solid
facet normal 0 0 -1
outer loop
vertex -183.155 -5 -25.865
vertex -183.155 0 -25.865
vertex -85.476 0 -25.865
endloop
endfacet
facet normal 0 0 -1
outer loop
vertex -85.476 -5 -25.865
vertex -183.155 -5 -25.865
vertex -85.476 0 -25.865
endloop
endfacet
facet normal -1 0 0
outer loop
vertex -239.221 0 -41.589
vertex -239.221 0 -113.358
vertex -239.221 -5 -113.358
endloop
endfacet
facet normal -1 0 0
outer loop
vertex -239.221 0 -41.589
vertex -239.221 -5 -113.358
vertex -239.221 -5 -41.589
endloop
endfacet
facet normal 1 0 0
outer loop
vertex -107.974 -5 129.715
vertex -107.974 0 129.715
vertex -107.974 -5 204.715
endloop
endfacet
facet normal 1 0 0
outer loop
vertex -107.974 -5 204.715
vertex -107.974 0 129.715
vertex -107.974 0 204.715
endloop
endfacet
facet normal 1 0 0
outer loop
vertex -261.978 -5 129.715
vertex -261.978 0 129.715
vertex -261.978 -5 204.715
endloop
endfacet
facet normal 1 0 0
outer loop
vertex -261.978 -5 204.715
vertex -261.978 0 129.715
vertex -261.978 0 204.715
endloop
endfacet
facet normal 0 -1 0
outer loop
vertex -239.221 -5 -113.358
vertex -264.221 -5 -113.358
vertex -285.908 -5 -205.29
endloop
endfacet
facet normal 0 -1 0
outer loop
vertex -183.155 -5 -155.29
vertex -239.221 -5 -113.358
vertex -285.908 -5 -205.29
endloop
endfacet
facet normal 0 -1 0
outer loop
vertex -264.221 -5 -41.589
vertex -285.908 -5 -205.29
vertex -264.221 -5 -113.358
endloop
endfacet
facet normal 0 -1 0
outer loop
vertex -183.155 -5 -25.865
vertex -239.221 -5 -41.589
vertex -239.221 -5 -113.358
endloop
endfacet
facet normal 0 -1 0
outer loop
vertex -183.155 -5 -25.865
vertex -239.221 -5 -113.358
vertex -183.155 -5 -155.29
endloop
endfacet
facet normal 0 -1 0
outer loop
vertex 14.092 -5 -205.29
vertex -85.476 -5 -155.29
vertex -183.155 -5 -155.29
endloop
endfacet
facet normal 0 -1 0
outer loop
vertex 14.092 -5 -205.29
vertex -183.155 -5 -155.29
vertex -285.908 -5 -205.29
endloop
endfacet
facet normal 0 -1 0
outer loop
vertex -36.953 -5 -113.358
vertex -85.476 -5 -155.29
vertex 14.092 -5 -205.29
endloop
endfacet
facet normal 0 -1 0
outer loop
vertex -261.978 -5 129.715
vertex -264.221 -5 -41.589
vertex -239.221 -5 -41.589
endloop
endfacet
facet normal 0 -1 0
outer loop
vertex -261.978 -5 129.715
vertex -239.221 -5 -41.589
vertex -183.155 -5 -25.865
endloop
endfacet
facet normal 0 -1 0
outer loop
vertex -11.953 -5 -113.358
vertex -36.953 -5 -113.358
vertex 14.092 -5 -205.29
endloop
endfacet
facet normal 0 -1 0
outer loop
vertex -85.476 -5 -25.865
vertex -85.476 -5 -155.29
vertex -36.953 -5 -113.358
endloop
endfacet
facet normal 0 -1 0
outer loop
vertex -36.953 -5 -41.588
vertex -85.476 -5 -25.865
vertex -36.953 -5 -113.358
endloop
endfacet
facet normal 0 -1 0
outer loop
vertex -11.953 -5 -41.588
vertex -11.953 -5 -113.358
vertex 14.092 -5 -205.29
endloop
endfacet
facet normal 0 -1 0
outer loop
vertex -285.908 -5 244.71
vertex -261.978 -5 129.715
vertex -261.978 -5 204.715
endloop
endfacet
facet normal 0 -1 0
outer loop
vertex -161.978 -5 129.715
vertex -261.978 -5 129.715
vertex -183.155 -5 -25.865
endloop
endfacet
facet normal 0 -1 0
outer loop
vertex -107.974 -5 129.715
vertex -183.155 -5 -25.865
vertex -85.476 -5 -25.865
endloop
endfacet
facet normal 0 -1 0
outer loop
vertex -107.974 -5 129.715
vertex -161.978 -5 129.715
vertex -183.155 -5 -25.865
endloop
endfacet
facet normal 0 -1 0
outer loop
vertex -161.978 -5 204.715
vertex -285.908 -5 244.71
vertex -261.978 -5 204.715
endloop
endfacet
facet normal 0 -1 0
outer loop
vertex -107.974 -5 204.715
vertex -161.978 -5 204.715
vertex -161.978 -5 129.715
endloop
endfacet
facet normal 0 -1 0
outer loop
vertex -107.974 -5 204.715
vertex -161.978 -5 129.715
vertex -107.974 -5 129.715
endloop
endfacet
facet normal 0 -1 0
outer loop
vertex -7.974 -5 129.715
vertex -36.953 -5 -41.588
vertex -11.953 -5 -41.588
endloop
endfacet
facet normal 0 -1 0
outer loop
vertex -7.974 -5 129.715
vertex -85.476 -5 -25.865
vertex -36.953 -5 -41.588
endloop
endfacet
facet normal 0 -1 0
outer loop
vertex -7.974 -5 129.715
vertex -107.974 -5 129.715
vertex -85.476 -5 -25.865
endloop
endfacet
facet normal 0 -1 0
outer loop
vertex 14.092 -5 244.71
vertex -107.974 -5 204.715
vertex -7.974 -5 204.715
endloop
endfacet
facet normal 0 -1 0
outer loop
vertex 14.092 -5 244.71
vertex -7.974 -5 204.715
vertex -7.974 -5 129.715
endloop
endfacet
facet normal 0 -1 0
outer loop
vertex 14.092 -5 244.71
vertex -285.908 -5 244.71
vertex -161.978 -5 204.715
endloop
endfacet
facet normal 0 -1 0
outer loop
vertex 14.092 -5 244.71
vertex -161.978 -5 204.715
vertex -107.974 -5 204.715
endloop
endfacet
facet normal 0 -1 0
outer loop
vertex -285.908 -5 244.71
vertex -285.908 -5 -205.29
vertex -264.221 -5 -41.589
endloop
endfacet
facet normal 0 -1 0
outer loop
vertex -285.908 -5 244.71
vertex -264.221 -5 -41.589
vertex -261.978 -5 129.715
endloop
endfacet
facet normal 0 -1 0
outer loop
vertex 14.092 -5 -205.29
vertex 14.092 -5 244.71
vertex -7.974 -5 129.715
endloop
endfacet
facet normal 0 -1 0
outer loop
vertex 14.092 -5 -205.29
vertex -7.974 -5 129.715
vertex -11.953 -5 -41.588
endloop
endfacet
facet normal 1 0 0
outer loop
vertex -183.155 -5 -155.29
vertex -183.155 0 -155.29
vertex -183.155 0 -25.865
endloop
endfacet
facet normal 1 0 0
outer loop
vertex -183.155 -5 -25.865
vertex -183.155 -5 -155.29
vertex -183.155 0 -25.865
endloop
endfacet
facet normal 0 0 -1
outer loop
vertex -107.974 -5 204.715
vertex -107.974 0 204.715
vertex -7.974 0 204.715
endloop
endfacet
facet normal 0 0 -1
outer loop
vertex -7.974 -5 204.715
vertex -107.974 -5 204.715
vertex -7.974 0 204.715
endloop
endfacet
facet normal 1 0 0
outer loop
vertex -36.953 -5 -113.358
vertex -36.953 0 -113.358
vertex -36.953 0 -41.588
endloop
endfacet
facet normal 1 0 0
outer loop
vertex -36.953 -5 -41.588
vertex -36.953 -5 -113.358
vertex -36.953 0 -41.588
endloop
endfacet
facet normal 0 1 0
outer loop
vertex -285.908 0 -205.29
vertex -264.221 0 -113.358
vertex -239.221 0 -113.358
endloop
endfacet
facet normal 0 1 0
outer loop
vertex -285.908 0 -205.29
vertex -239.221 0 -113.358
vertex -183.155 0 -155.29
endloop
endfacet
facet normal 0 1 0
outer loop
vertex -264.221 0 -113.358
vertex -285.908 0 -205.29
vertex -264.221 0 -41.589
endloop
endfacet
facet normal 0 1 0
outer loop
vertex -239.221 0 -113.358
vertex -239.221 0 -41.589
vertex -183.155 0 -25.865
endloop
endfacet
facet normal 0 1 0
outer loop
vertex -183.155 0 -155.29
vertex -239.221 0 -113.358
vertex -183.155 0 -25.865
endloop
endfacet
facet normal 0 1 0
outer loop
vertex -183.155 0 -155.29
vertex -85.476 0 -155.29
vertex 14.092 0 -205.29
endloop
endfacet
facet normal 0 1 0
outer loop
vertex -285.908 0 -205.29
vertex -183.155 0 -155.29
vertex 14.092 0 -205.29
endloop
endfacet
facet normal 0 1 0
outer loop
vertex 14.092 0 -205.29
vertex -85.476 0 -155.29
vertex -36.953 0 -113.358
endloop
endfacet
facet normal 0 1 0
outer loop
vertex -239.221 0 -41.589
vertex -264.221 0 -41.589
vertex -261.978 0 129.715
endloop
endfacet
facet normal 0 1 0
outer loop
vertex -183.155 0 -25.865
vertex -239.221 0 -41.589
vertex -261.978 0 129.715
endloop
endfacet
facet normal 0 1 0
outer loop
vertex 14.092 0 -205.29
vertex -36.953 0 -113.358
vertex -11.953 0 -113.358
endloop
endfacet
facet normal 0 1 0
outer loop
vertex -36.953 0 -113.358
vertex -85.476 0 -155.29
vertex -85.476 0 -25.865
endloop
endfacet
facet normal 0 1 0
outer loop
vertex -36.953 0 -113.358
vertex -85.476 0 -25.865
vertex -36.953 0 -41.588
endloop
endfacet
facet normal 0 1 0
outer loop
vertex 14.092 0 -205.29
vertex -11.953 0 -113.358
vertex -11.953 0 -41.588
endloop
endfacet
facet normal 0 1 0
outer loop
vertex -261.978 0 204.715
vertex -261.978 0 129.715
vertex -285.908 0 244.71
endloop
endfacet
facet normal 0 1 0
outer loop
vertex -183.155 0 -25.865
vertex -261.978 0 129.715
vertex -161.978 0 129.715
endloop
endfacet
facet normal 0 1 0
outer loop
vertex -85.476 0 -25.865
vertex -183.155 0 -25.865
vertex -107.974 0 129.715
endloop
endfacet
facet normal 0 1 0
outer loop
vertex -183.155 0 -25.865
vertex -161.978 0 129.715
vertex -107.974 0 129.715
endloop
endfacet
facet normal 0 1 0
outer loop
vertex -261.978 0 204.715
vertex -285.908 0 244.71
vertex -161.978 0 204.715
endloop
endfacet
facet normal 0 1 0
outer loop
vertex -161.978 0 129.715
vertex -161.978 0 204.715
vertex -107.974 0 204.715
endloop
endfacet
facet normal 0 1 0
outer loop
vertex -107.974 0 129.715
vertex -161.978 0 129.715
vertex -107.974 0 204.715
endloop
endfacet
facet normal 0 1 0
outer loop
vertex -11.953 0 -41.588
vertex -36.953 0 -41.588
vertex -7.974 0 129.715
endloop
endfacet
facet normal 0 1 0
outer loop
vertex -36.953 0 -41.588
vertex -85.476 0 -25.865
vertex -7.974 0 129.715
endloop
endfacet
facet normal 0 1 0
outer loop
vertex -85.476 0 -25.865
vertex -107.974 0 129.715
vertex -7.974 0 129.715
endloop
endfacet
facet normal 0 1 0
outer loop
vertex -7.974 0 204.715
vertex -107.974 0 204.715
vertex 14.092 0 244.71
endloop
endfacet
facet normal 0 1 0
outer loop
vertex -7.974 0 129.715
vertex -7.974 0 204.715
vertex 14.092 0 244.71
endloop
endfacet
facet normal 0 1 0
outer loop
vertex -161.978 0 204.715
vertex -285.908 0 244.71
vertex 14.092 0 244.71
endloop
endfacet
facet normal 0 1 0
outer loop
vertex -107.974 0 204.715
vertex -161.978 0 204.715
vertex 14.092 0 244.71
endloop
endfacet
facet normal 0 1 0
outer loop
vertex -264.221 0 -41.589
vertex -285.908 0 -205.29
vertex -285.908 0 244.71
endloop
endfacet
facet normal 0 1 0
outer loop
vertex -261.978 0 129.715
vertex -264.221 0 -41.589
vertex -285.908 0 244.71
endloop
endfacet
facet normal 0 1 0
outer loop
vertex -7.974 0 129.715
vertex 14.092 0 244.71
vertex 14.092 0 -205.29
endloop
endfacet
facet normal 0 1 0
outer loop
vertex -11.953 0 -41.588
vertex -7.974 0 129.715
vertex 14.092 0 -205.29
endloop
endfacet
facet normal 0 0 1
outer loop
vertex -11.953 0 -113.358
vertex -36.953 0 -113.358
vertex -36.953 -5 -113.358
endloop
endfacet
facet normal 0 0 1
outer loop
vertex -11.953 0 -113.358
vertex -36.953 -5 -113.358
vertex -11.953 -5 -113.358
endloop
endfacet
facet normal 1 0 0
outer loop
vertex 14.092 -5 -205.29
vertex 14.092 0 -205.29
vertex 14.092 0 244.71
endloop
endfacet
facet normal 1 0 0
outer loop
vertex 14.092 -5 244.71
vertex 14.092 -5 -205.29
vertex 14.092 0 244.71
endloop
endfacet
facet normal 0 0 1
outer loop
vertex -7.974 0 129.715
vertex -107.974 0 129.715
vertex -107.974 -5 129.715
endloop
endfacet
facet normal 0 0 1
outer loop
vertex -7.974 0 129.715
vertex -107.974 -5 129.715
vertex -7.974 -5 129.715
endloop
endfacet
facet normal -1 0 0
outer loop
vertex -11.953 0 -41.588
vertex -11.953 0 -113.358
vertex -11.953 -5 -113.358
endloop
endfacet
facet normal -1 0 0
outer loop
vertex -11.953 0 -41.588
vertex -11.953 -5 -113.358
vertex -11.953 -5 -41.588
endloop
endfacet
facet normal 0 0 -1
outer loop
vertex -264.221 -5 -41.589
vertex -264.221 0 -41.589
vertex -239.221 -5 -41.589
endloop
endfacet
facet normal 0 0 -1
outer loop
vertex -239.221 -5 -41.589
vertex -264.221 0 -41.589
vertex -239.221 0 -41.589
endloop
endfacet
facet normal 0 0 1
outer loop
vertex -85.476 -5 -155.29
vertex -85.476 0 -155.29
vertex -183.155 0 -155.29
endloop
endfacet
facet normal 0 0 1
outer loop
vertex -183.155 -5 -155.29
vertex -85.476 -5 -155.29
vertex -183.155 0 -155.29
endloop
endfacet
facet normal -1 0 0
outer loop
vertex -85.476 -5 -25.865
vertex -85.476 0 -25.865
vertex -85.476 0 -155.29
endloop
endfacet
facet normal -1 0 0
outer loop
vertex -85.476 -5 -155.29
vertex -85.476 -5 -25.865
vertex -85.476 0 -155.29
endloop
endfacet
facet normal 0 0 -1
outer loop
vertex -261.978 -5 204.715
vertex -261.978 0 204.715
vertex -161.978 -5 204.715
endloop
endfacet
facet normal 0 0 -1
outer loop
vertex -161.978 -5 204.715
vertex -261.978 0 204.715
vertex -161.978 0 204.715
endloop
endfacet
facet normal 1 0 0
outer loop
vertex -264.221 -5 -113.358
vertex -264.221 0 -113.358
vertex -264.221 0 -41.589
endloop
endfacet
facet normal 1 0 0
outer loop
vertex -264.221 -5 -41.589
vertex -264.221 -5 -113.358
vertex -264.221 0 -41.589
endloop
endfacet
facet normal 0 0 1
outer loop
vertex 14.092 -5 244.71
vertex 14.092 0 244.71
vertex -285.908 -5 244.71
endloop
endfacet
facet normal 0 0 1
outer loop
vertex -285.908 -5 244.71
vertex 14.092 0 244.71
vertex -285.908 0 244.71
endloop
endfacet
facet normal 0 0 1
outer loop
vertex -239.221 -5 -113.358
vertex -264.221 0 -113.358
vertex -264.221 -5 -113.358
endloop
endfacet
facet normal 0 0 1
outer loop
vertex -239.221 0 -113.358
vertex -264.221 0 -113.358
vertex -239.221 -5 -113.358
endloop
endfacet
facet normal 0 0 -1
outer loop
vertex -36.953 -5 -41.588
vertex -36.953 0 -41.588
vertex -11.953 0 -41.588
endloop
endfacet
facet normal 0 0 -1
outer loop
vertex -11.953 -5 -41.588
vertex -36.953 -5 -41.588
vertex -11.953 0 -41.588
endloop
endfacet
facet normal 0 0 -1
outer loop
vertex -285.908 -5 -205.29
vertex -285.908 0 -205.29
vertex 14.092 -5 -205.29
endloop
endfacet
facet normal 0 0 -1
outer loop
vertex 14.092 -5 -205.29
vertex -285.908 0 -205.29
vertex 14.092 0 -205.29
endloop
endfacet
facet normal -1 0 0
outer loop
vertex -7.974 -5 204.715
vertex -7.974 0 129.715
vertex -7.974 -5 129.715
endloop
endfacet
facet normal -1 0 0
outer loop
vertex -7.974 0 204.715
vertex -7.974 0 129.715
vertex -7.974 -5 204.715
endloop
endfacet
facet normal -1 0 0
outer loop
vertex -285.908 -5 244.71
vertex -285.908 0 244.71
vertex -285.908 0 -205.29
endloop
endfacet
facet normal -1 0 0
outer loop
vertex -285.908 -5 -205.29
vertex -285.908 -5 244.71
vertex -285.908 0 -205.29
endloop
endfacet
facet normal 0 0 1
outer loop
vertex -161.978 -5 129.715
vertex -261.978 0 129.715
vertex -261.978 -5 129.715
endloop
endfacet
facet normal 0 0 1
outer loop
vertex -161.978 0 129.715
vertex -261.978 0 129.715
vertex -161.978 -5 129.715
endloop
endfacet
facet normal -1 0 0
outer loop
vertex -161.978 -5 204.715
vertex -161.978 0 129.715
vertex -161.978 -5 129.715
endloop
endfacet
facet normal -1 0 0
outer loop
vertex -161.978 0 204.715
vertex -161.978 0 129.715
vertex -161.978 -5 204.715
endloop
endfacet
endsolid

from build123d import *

# Parameters (mm, degrees)
F0_W     = 100
F0_H     = 75
F0_W_2   = 25
F0_H_2   = 71.768835
F0_H_3   = 71.77
F1_DEPTH = 5


with BuildPart() as f1:
    # F0 (on Front) → F1 (new body)
    with BuildSketch(Plane.XZ):
        Polygon((14.091592, 244.709768), (-285.908408, 244.709768), (-285.908408, 129.419536), (-285.908408, 64.709768), (14.091592, 64.709768), (14.091592, 69.656026), align=None)
        with Locations((-211.977881, 167.215428)):
            Rectangle(F0_W, F0_H, mode=Mode.SUBTRACT)
        with Locations((-57.973918, 167.215428)):
            Rectangle(F0_W, F0_H, mode=Mode.SUBTRACT)
        Polygon((14.091592, 64.709768), (-285.908408, 64.709768), (-285.908408, 24.709768), (14.091592, 24.709768), (14.091592, 59.763511), align=None)
        Polygon((14.091592, 24.709768), (-285.908408, 24.709768), (-285.908408, 0), (-285.908408, -205.290232), (-197.684959, -205.290232), (-77.684959, -205.290232), (14.091592, -205.290232), align=None)
        with Locations((-251.720655, -77.47348)):
            Rectangle(F0_W_2, F0_H_2, mode=Mode.SUBTRACT)
        Polygon((-135.837302, -155.290232), (-183.15503, -155.290232), (-183.15503, -25.864778), (-134.315275, -25.864778), (-85.475519, -25.864778), (-85.475519, -155.290232), align=None, mode=Mode.SUBTRACT)
        with Locations((-24.452682, -77.472898)):
            Rectangle(F0_W_2, F0_H_3, mode=Mode.SUBTRACT)
    extrude(amount=F1_DEPTH)


solid = f1.part
